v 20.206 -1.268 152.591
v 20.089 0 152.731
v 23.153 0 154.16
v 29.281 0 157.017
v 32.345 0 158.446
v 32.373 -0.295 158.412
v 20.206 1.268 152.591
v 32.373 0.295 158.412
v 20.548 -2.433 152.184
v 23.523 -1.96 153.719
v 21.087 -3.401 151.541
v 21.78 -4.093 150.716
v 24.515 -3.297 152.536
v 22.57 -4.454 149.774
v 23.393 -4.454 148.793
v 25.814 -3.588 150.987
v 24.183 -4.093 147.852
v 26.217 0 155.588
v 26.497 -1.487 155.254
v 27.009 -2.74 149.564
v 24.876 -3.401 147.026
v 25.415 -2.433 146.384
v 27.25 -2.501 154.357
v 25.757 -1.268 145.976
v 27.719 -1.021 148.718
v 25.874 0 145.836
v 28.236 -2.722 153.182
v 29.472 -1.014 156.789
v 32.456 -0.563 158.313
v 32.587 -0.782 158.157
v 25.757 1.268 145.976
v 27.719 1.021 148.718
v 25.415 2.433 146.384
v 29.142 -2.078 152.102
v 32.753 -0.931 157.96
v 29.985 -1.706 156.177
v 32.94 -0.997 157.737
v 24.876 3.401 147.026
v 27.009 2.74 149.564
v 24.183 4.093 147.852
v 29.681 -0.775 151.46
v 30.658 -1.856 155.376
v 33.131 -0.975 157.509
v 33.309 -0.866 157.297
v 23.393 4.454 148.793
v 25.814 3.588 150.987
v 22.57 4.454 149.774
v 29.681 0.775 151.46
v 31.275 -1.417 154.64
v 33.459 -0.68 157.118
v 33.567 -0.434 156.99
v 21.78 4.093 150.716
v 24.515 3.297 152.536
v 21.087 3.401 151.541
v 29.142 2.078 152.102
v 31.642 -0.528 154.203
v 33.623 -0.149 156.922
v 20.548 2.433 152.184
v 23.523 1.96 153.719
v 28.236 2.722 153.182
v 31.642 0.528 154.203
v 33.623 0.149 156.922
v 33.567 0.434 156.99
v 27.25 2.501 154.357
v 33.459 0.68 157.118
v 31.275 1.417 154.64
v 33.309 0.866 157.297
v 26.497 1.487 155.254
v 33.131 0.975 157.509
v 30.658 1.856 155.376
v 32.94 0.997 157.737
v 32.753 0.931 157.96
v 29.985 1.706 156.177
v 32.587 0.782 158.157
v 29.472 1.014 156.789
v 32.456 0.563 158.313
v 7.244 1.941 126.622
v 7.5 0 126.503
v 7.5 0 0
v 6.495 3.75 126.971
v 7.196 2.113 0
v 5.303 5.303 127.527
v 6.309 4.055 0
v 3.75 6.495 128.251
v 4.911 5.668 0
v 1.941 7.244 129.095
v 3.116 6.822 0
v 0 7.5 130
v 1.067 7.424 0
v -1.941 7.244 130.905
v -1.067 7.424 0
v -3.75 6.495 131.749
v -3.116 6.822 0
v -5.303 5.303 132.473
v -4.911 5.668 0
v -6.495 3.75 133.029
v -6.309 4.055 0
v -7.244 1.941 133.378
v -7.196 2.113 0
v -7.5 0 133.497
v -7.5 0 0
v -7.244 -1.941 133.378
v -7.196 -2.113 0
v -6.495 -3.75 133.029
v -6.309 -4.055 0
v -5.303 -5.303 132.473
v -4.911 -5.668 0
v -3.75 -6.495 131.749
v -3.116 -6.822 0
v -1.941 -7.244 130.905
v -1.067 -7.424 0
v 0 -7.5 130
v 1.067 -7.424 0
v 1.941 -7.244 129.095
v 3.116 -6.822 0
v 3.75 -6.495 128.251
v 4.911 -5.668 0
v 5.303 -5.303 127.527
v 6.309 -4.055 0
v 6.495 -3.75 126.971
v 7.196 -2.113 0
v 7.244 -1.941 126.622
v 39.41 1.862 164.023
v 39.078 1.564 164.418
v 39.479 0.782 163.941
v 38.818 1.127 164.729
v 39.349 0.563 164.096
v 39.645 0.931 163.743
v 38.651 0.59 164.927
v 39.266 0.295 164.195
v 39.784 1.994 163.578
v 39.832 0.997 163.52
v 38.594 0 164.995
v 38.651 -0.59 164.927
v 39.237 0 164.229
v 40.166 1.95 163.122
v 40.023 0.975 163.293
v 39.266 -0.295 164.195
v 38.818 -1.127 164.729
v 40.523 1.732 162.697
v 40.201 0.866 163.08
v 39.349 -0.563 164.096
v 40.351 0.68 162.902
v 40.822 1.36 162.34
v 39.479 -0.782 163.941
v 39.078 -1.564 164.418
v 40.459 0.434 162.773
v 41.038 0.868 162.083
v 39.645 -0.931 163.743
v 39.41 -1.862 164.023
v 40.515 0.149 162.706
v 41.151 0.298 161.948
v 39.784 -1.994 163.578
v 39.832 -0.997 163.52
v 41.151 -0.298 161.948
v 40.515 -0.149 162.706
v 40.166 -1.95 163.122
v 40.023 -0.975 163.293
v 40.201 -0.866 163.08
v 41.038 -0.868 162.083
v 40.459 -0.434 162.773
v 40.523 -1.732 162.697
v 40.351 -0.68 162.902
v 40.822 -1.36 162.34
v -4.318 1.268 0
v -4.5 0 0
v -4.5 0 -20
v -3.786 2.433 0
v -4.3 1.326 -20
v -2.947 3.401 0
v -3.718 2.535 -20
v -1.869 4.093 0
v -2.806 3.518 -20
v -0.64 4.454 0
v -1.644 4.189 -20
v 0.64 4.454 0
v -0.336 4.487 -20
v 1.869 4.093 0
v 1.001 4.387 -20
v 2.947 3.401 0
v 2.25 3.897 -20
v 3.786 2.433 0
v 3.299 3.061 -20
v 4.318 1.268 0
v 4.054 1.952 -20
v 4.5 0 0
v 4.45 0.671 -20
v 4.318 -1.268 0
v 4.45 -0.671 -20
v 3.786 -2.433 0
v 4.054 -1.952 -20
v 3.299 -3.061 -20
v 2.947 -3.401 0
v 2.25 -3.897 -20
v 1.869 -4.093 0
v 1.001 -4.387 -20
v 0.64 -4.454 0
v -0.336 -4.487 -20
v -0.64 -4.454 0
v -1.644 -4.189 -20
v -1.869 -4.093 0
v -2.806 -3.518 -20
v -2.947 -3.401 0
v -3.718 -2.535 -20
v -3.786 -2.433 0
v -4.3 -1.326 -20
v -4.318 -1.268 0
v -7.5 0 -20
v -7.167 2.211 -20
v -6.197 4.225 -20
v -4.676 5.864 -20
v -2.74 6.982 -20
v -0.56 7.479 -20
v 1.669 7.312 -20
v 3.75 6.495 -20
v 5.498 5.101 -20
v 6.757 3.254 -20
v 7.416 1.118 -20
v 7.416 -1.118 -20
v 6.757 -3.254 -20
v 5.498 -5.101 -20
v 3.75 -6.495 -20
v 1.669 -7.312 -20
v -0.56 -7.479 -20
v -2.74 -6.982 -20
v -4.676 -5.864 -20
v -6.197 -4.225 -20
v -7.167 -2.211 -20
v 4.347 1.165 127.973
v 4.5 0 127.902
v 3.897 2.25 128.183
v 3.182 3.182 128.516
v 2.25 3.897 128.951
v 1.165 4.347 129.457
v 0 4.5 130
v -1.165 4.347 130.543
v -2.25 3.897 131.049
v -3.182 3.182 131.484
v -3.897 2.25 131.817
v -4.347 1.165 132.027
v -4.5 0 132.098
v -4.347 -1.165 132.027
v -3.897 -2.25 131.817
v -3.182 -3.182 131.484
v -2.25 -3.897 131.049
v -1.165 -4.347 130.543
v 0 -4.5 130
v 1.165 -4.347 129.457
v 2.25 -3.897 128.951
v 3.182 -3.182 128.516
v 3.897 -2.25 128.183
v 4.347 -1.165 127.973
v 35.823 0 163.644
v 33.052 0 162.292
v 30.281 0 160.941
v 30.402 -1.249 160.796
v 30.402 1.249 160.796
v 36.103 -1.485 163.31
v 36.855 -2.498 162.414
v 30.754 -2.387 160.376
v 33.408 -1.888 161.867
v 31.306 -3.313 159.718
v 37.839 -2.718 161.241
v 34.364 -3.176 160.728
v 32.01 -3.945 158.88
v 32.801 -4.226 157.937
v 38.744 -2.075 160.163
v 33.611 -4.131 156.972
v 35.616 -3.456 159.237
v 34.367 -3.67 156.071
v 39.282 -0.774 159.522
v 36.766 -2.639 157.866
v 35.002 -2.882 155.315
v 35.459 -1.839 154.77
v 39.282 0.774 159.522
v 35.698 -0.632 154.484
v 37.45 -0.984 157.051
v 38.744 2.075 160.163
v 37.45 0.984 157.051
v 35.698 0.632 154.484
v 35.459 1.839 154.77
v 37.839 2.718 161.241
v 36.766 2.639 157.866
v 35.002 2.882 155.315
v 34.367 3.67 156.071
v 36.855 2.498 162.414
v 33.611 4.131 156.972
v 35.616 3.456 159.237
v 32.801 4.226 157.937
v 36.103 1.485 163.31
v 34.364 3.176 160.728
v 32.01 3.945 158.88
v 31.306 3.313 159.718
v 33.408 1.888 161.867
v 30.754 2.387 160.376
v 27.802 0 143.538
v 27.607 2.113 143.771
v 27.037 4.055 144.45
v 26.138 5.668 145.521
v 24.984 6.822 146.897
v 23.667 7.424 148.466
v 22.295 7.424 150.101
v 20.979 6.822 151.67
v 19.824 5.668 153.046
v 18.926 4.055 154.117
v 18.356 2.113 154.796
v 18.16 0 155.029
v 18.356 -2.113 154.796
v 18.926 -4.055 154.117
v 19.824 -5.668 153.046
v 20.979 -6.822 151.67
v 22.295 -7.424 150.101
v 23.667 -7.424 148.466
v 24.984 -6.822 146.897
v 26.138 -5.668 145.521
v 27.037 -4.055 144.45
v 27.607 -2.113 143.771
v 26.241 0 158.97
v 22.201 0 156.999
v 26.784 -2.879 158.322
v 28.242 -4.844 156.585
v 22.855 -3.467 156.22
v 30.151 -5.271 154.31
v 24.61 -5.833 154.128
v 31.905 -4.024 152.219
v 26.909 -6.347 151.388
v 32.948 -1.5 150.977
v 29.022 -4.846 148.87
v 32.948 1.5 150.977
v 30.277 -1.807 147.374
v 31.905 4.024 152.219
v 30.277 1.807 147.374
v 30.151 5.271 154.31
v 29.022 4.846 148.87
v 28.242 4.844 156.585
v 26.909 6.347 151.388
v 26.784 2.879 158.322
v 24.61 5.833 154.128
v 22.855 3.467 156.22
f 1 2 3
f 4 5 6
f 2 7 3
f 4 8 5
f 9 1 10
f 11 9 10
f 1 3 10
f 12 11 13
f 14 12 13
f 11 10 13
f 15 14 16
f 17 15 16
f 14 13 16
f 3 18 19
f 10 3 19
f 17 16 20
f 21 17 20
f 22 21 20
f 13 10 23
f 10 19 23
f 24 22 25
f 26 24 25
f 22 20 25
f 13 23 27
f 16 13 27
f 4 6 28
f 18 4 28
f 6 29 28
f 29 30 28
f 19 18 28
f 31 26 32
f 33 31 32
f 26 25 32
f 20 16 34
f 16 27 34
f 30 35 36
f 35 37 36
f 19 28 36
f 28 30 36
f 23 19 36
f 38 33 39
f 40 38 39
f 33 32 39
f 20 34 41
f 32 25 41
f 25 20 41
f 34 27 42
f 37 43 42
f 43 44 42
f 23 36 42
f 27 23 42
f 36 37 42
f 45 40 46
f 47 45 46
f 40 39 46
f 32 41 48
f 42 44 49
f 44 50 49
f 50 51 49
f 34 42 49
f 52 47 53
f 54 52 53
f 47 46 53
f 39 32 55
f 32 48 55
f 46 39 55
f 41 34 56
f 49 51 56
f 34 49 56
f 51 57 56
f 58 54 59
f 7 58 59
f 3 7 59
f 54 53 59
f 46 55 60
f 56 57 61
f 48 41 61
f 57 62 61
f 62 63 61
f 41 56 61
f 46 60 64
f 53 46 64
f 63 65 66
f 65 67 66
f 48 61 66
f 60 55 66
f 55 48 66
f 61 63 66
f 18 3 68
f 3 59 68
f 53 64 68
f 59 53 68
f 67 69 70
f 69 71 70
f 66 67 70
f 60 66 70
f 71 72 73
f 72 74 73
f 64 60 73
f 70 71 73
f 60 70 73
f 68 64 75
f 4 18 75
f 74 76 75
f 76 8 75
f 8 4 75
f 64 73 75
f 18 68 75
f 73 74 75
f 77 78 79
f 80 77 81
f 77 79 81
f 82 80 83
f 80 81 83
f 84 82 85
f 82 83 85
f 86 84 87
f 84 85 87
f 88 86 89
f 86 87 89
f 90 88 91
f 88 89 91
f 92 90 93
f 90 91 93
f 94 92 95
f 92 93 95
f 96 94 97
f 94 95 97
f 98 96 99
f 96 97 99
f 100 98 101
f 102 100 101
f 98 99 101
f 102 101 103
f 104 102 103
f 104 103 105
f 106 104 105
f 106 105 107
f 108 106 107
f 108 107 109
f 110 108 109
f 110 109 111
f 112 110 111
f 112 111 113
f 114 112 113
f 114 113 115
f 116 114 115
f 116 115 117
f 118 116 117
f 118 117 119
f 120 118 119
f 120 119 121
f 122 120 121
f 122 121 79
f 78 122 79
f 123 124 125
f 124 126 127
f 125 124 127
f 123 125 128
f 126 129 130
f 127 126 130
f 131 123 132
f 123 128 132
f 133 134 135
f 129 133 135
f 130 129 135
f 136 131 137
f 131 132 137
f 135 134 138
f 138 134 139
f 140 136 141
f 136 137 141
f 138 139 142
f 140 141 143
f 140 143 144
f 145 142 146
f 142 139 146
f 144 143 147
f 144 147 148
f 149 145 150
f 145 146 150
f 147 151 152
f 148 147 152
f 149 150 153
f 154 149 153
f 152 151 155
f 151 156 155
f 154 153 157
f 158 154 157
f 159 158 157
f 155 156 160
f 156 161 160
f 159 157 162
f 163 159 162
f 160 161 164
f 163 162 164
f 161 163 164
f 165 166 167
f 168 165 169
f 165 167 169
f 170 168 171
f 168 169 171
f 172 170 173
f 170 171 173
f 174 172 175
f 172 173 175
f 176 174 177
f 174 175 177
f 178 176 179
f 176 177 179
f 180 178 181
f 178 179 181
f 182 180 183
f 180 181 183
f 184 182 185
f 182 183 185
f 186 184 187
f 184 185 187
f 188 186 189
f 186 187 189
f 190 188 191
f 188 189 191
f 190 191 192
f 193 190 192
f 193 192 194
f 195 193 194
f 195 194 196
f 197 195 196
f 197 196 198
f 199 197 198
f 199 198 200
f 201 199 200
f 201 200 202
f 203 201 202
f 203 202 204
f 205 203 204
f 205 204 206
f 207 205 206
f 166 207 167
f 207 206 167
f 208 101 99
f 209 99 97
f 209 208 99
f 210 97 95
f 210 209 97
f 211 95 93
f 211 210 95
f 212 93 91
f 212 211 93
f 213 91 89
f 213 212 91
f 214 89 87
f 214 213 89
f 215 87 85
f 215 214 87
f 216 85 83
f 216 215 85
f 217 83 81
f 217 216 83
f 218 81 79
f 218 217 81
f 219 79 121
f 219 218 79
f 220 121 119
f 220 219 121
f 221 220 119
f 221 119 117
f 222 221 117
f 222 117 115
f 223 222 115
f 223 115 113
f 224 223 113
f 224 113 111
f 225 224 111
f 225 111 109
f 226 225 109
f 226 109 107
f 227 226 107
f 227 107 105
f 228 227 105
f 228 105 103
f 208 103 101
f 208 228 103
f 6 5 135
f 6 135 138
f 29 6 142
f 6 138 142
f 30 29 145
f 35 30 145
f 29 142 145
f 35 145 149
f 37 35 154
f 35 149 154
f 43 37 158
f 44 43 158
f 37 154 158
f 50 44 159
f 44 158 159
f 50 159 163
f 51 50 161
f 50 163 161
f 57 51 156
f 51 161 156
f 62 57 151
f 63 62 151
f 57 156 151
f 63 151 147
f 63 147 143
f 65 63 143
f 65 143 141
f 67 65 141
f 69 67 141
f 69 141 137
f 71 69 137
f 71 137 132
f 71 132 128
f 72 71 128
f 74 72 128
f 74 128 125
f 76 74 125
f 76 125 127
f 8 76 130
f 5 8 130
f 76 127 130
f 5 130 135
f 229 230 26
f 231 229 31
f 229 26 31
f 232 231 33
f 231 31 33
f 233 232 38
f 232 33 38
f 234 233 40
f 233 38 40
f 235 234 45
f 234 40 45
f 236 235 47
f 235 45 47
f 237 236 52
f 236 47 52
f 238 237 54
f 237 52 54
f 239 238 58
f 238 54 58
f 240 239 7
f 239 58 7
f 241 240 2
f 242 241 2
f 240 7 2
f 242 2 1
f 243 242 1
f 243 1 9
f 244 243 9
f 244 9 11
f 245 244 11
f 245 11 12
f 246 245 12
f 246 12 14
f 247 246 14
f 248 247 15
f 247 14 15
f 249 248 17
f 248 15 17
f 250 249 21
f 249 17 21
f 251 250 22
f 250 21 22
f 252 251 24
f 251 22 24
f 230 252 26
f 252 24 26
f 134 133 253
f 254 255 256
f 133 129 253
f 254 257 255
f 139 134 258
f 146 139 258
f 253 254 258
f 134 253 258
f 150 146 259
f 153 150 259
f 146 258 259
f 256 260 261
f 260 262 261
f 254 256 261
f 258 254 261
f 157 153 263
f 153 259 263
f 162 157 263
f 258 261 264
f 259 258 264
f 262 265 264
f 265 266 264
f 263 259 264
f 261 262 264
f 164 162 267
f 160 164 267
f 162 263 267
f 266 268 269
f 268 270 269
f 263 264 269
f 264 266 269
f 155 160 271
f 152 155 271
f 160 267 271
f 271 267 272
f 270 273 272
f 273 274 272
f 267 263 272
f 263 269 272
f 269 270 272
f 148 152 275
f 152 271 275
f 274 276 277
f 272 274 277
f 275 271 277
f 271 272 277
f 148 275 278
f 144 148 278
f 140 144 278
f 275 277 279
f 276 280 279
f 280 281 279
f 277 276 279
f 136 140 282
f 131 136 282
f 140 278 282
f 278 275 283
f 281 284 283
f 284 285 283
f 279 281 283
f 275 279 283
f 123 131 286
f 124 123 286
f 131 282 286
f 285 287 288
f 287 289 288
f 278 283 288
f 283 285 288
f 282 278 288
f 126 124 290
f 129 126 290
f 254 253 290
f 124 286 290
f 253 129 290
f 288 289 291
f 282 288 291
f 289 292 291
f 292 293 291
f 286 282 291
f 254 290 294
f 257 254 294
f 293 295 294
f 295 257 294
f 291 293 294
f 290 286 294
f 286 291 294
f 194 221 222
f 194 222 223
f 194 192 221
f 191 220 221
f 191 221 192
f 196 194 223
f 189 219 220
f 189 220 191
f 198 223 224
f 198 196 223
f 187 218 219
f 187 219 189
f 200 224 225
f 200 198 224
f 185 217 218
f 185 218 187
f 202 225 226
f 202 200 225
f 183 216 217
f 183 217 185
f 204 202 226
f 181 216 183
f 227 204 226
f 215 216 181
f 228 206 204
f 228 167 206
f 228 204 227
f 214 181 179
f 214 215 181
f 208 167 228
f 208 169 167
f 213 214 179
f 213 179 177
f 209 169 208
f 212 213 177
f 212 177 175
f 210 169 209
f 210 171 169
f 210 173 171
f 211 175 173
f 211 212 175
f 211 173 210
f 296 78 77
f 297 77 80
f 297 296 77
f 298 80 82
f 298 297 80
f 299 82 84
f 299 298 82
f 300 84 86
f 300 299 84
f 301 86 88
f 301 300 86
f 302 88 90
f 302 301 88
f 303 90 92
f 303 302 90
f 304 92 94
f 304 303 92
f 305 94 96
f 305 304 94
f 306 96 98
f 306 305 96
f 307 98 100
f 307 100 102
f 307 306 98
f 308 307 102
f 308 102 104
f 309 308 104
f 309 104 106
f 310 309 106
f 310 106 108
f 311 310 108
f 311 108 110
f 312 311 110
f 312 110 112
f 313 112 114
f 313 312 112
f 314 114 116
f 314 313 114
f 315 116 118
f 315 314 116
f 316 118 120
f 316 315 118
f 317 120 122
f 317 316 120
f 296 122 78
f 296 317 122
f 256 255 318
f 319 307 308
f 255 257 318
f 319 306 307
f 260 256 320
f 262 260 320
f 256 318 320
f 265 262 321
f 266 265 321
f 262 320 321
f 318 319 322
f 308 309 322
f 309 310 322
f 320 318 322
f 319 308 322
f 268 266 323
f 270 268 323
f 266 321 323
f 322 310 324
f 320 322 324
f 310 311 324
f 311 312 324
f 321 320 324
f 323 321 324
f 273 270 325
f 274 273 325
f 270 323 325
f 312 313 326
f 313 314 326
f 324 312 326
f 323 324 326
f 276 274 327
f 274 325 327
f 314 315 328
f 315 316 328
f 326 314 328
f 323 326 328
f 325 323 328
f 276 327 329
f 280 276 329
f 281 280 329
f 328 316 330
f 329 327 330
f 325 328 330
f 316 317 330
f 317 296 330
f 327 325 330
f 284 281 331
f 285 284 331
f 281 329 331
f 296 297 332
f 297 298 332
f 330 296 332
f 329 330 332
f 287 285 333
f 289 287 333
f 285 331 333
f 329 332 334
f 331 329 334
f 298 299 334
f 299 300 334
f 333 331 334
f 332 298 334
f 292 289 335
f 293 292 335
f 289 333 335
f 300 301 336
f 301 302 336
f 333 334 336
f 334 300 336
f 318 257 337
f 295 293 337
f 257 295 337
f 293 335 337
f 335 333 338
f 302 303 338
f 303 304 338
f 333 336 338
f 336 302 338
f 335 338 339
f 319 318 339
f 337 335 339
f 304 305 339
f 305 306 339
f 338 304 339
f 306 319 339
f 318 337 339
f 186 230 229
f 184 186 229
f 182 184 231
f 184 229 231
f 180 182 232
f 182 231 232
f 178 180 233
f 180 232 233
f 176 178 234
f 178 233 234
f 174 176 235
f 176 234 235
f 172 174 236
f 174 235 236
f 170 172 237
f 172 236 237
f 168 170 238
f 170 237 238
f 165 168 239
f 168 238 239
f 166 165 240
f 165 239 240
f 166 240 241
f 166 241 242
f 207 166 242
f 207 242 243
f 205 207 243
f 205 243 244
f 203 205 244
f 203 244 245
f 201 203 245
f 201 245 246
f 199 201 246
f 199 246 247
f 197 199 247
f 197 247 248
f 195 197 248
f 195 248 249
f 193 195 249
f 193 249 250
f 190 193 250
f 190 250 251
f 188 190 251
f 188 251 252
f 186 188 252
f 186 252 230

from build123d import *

# Parameters (mm, degrees)
SKETCH_1_R      = 7.5
SKETCH_1_R_2    = 4.5
EXTRUDE_1_DEPTH = 100
SKETCH_3_R      = 7.5
SKETCH_3_R_2    = 4.5
EXTRUDE_START   = 20
SKETCH_6_R      = 7.5
SKETCH_6_R_2    = 4.5
EXTRUDE_2_DEPTH = 20


with BuildPart() as part:
    # 草图1 → 凸台-拉伸1 (new body)
    with BuildSketch(Plane.XY):
        Circle(SKETCH_1_R)
        Circle(SKETCH_1_R_2, mode=Mode.SUBTRACT)
    extrude(amount=EXTRUDE_1_DEPTH)

    # 扫描1: sweep along a path in 草图2
    with BuildLine(Plane(origin=(0, 0, 0), x_dir=(1, 0, 0), z_dir=(0, 1, 0))) as sweep_1_path:
        Line((0, -100), (0, -130))
        Line((0, -130), (22.981333294, -149.283628291))
    # 草图3 → 扫描1 (sweep)
    with BuildSketch(Plane.XY.offset(100)):
        Circle(SKETCH_3_R)
        Circle(SKETCH_3_R_2, mode=Mode.SUBTRACT)
    sweep(path=sweep_1_path.line, transition=Transition.RIGHT)

    # 草图5 → 旋转1 (revolve)
    with BuildSketch(Plane(origin=(0, 0, 0), x_dir=(1, 0, 0), z_dir=(0, 1, 0)), mode=Mode.PRIVATE) as revolve_1_sk:
        Polygon((27.802240366, -143.538294967), (25.873877537, -145.836428297), (33.630329642, -156.91378991), (40.52252136, -162.697025438), (41.16530897, -161.930980995), (35.728697758, -154.448127615), align=None)
    revolve(revolve_1_sk.sketch.rotate(Axis((0, 0, 130), (0.7660444431189799, 0, 0.6427876096865373)), 180), axis=Axis((0, 0, 130), (0.7660444431189799, 0, 0.6427876096865373)))

    # 草图6 → 凸台-拉伸2 (add)
    with BuildSketch(Plane(origin=(0, 0, 0), x_dir=(-1, 0, 0), z_dir=(0, 0, -1)).offset(EXTRUDE_START)):
        Circle(SKETCH_6_R)
        Circle(SKETCH_6_R_2, mode=Mode.SUBTRACT)
    extrude(amount=-EXTRUDE_2_DEPTH)


solid = part.part
